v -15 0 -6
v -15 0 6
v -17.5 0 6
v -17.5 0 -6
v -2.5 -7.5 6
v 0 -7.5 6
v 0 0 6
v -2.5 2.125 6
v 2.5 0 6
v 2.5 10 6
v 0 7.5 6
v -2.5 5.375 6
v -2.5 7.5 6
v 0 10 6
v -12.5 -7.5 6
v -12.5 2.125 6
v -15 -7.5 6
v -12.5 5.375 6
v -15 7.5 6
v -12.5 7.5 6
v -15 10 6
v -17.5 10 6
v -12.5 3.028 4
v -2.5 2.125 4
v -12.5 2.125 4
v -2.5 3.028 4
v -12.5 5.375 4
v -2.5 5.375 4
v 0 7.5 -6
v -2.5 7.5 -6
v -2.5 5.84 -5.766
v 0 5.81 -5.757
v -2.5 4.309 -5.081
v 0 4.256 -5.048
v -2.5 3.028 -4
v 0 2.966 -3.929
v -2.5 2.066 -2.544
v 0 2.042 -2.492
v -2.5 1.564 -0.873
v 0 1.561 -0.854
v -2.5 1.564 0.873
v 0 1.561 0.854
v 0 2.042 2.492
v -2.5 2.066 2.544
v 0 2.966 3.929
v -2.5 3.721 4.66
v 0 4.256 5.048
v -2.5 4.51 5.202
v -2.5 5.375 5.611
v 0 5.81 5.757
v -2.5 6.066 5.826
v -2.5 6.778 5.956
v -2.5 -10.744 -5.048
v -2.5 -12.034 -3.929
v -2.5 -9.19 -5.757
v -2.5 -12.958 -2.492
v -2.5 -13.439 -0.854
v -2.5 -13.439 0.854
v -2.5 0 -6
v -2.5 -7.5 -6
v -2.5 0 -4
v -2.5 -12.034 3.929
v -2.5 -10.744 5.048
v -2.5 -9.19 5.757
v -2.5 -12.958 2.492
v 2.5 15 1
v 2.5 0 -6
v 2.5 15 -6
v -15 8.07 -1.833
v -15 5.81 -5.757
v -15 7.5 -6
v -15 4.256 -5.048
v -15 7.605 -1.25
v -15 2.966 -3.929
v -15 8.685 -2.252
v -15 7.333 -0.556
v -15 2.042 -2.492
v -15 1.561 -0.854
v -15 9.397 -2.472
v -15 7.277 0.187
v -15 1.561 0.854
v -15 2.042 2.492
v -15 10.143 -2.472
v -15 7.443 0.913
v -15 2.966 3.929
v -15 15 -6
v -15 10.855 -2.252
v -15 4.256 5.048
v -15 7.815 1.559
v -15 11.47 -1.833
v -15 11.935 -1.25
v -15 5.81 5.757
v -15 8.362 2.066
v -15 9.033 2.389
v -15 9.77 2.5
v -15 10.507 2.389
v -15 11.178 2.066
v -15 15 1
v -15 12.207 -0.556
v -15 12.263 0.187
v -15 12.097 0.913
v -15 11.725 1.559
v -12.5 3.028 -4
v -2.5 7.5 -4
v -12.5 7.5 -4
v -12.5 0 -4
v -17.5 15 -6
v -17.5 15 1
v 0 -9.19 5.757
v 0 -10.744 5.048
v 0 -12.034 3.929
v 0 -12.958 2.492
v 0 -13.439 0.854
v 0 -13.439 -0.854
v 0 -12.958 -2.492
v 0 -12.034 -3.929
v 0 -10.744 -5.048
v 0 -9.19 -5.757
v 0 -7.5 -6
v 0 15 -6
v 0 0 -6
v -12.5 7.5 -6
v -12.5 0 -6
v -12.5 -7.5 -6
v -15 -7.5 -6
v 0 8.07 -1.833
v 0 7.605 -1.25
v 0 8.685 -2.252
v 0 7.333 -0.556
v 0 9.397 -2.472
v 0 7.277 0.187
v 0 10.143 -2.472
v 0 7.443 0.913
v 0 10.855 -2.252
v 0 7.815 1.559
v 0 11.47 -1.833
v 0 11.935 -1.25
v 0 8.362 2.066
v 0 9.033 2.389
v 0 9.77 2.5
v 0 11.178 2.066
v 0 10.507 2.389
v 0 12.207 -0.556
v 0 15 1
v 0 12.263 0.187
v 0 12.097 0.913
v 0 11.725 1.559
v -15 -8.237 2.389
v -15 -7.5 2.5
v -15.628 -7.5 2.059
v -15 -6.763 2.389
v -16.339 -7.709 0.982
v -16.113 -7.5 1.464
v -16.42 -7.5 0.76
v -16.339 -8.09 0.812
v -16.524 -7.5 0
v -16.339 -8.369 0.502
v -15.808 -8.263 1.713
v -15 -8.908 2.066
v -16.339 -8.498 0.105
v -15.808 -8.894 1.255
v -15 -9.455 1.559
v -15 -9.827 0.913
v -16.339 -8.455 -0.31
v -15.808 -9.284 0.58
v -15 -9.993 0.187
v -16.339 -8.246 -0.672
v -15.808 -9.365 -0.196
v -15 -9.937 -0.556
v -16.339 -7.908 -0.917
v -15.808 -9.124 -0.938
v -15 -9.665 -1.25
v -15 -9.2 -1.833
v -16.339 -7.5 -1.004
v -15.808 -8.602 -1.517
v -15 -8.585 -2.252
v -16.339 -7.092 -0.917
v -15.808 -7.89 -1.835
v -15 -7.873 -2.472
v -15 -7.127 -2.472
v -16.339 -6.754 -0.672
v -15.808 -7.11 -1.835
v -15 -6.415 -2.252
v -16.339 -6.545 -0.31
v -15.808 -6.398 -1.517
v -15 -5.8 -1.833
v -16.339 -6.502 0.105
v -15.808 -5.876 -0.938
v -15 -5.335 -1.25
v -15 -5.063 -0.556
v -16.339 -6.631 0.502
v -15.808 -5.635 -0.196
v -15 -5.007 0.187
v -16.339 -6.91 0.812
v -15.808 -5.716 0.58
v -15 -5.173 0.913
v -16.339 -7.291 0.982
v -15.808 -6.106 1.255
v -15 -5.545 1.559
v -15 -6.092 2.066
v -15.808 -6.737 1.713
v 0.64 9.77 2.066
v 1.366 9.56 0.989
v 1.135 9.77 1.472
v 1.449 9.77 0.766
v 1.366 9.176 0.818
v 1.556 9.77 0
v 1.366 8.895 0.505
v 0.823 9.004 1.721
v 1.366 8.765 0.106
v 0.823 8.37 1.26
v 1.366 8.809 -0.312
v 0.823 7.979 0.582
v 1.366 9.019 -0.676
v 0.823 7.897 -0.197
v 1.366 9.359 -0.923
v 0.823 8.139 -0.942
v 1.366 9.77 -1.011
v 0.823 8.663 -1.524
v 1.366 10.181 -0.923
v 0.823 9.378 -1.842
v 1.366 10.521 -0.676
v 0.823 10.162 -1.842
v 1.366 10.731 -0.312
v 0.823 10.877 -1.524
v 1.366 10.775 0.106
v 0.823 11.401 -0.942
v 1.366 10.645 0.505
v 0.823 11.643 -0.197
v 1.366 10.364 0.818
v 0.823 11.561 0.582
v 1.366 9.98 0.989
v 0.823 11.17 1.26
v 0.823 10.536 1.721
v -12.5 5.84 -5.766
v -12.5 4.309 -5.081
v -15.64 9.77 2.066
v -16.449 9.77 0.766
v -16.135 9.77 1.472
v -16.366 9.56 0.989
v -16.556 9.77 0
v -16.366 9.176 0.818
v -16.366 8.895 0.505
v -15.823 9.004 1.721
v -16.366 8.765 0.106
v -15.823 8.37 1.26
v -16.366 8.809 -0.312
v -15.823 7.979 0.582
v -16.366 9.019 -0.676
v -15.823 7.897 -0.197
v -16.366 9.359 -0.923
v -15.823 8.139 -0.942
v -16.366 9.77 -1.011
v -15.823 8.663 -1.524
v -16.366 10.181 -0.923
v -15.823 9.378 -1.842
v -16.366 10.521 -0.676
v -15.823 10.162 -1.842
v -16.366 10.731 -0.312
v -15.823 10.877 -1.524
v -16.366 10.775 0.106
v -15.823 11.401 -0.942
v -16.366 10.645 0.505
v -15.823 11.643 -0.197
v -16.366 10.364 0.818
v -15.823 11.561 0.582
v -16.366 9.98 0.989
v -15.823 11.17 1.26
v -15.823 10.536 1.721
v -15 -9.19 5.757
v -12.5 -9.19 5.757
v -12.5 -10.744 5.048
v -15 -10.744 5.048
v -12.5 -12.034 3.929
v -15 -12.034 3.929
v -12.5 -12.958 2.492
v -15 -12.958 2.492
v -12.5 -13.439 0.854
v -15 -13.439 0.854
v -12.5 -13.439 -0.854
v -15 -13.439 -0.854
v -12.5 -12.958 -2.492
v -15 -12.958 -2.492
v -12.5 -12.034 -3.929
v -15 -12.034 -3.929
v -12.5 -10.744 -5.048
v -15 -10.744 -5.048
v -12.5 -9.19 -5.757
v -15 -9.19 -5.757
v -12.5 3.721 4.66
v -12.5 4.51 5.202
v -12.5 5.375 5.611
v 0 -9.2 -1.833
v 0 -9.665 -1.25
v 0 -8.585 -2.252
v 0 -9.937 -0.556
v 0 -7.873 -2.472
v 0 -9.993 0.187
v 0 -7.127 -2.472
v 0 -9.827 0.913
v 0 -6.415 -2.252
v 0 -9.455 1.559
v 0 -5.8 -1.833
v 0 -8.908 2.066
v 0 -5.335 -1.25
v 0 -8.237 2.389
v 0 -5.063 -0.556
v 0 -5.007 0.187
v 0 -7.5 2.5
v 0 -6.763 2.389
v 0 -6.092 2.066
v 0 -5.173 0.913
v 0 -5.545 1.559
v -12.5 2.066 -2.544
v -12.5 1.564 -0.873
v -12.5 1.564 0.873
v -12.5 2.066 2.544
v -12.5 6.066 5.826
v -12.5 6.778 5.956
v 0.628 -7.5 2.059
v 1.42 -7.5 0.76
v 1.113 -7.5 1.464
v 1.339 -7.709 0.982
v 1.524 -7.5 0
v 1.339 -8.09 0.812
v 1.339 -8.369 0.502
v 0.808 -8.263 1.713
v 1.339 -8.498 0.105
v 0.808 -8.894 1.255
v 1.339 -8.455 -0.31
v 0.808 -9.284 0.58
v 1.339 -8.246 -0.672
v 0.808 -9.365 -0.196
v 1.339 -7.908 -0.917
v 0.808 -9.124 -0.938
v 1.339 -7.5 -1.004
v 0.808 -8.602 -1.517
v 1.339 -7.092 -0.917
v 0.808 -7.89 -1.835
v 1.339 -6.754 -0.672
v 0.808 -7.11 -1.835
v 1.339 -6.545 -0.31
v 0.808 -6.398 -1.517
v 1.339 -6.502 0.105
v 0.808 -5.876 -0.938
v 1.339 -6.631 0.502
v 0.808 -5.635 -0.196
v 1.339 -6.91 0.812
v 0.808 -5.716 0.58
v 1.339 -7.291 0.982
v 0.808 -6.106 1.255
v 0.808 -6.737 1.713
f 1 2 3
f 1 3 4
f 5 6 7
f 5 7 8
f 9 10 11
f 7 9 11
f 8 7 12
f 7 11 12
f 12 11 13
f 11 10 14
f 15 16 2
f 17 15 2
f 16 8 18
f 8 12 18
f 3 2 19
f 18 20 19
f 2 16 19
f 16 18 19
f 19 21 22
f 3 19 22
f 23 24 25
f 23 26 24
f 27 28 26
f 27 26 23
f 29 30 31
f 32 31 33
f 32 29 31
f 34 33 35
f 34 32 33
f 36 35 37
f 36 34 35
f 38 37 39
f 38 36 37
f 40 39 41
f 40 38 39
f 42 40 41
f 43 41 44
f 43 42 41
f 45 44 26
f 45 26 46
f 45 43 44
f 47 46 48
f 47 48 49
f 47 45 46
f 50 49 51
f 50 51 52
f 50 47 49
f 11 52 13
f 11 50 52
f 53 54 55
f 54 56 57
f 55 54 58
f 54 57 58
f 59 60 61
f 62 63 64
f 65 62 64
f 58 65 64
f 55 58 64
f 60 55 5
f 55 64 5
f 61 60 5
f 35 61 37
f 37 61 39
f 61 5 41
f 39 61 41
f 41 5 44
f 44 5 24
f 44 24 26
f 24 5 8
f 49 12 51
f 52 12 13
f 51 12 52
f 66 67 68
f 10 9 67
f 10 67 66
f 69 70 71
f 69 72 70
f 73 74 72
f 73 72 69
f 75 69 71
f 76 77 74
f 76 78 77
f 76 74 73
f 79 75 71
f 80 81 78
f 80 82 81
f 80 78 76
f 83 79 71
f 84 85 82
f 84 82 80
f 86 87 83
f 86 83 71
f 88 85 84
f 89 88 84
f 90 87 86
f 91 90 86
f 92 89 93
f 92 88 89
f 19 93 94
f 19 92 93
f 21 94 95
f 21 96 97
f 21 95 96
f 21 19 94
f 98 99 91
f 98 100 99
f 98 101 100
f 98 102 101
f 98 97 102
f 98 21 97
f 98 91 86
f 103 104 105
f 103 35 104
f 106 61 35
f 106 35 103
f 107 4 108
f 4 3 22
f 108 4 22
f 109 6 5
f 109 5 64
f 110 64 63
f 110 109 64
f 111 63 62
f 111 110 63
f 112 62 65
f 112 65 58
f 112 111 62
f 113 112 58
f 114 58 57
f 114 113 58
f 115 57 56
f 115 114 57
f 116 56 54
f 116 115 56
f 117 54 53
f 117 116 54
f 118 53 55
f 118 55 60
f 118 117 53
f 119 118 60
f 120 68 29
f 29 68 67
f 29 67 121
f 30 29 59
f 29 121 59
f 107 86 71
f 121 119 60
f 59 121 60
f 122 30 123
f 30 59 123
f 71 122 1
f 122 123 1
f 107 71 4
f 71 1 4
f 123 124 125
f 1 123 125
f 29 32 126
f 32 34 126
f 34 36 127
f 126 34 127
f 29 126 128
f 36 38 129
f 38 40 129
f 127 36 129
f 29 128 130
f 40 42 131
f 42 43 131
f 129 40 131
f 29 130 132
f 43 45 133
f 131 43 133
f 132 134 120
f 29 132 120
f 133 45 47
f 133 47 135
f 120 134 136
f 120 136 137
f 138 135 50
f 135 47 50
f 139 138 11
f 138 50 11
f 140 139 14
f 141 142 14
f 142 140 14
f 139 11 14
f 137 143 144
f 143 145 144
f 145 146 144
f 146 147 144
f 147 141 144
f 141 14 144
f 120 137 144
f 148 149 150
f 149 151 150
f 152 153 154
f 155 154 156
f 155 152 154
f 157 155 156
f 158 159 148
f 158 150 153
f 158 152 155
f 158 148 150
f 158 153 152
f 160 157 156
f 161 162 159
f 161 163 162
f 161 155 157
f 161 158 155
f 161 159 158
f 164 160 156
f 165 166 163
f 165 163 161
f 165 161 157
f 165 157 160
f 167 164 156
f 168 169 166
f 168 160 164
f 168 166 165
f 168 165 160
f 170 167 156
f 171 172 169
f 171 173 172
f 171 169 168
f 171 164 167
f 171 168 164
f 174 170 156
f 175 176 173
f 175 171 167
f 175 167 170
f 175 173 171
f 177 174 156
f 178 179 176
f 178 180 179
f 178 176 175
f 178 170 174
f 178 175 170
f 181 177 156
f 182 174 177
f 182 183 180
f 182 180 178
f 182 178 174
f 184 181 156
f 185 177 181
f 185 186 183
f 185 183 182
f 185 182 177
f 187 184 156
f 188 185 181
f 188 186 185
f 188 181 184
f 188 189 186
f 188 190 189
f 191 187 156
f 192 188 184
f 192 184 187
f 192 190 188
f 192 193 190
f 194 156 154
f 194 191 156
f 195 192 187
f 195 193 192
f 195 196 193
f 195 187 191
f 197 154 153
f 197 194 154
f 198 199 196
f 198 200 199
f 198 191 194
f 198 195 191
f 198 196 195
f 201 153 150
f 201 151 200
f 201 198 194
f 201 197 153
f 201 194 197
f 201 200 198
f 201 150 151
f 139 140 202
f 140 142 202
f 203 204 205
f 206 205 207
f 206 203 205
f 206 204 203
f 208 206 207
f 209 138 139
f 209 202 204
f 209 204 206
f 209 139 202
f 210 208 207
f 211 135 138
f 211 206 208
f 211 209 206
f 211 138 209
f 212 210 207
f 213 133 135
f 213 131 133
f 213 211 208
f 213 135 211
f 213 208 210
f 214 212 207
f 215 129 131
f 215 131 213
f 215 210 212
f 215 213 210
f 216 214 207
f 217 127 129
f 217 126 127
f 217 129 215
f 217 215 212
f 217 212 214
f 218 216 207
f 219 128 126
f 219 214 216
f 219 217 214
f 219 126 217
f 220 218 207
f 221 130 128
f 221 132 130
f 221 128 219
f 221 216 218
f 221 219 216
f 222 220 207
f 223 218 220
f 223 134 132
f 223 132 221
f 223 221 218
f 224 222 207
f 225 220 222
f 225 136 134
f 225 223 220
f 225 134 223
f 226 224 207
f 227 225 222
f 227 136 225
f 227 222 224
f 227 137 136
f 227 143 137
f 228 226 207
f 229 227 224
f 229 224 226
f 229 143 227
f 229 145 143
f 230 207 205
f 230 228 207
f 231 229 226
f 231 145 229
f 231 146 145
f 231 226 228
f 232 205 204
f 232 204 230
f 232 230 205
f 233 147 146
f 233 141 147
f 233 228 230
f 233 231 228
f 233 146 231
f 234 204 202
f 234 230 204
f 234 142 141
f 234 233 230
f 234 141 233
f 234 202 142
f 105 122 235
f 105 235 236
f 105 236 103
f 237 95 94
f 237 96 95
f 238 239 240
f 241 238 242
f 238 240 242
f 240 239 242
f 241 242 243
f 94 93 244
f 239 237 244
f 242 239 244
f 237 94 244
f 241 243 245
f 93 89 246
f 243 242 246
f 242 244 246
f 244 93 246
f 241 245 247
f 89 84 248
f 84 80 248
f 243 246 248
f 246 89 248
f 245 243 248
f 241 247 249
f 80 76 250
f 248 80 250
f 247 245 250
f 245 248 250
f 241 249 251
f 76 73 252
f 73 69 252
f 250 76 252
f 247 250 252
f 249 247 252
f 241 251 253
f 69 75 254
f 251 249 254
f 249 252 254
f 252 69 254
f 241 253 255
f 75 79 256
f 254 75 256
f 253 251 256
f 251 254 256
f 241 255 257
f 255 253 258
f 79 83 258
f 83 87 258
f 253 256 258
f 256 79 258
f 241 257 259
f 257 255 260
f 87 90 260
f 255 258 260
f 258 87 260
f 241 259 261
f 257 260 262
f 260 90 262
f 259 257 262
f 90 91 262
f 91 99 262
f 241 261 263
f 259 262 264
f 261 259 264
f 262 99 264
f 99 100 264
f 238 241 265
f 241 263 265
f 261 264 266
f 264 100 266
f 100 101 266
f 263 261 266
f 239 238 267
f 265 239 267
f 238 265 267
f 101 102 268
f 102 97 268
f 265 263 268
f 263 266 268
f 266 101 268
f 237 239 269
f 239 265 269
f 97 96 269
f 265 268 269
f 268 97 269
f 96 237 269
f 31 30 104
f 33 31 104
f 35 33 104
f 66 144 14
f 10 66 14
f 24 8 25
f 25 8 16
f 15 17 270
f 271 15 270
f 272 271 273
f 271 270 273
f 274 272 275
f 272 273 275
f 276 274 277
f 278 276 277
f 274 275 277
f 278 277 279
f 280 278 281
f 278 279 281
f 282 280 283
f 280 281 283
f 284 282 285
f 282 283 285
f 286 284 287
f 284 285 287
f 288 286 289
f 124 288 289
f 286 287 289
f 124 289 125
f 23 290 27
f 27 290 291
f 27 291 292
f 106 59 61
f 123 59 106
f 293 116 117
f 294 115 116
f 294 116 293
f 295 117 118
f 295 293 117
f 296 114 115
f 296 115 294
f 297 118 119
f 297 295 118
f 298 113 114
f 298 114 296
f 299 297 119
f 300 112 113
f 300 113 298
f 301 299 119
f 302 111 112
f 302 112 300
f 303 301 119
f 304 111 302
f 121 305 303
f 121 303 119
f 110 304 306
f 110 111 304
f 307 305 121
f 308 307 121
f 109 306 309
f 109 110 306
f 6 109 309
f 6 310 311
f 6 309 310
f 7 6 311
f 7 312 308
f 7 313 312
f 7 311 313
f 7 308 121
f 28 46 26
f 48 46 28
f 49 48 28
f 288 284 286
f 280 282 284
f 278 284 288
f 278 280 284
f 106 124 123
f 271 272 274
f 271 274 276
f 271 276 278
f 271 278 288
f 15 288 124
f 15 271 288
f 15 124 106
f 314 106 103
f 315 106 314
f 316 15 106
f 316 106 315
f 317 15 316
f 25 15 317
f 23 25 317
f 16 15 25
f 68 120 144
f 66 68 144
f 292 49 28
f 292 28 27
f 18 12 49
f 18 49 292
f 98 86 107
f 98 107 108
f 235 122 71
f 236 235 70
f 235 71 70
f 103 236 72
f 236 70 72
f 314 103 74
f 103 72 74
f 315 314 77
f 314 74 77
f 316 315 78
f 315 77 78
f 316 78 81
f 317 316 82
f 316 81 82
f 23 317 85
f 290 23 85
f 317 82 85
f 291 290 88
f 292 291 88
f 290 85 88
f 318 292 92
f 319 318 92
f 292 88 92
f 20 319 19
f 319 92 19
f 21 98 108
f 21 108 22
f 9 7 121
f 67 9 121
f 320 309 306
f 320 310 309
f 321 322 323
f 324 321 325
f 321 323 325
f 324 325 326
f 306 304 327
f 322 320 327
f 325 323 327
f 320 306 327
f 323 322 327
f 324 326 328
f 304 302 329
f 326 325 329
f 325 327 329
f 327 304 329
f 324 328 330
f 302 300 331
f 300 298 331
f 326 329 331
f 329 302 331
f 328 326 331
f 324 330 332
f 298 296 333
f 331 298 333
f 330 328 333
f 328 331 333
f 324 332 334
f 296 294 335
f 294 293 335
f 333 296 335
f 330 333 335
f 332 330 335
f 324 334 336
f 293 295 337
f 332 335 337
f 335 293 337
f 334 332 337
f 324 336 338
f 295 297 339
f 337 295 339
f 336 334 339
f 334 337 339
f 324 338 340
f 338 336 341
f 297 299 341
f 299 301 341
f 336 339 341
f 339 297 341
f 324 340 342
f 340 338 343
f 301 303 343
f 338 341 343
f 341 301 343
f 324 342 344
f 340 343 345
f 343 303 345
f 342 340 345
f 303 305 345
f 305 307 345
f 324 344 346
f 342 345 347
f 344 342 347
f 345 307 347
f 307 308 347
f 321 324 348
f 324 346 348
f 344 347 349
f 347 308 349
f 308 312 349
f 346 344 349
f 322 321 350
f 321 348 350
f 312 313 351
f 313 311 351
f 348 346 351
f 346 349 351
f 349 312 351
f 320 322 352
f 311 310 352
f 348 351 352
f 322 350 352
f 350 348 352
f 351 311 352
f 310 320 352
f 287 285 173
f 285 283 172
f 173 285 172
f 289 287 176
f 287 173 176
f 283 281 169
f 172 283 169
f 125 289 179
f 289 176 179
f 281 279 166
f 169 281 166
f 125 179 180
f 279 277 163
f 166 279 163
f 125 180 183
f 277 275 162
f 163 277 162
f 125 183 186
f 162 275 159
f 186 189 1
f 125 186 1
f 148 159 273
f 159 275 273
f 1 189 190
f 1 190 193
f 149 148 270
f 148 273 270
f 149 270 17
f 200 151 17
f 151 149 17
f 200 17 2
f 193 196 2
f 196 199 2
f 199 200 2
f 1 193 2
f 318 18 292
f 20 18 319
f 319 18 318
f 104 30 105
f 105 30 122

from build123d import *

# Parameters (mm, degrees)
F2_DEPTH  = 2.5
F4_DEPTH  = 2.5
F8_W      = 5
F8_H      = 3.25
F9_DEPTH  = 2
F10_W     = 5
F10_H     = 7.5
F11_DEPTH = 2


with BuildPart() as f2:
    # F1 (on Right) → F2 (new body)
    with BuildSketch(Plane.YZ):
        with BuildLine():
            ThreePointArc((7.5, -6), (1.5, 0), (7.5, 6))
            Line((7.5, 6), (-7.5, 6))
            ThreePointArc((-7.5, 6), (-13.5, 0), (-7.5, -6))
            Line((-7.5, -6), (7.5, -6))
        make_face()
    extrude(amount=-F2_DEPTH)

    # F0 (on Right) → F4 (join)
    with BuildSketch(Plane.YZ):
        Polygon((0, 6), (0, -6), (15, -6), (15, 1), (10, 6), align=None)
    extrude(amount=F4_DEPTH)

    # F6 (on offset) → F7 (revolve, cut)
    with BuildSketch(Plane.XZ.offset(-9.77)):
        with BuildLine():
            Line((-2.5325156748, 2.5), (-2.5325156748, 0))
            Line((-2.5325156748, 0), (1.556239127, 0))
            ThreePointArc((1.556239127, 0), (1.1353956611, 1.4724028169), (0, 2.5))
            Line((0, 2.5), (-2.5325156748, 2.5))
        make_face()
    revolve(axis=Axis((-10.801910348, 9.77, 0), (1, 0, 0)), mode=Mode.SUBTRACT)

    # F8 (on face) → F9 (join)
    with BuildSketch(Plane.XY.offset(6)):
        with Locations((-5, 3.75)):
            Rectangle(F8_W, F8_H)
    extrude(amount=-F9_DEPTH)

    # F10 (on face) → F11 (join)
    with BuildSketch(Plane(origin=(0, 0, -6), x_dir=(1, 0, 0), z_dir=(0, 0, -1))):
        with Locations((-5, -3.75)):
            Rectangle(F10_W, F10_H)
    extrude(amount=-F11_DEPTH)

    # F14 (on offset) → F15 (revolve)
    with BuildSketch(Plane.XZ.offset(7.5)):
        with BuildLine():
            Line((0, 0), (1.524425623, 0))
            ThreePointArc((1.524425623, 0), (1.1132612082, 1.4640588684), (0, 2.5))
            Line((0, 2.5), (0, 0))
        make_face()
    revolve(axis=Axis((-0.2374296736, -7.5, 0), (1, 0, 0)))

    # F16: F2 across plane


with BuildPart() as f2_1:
    add(f2.part)
    add(f2.part.mirror(Plane(origin=(-7.5, 3.75, -5), x_dir=(0, -1, 0), z_dir=(-1, 0, 0))))


solid = f2_1.part
